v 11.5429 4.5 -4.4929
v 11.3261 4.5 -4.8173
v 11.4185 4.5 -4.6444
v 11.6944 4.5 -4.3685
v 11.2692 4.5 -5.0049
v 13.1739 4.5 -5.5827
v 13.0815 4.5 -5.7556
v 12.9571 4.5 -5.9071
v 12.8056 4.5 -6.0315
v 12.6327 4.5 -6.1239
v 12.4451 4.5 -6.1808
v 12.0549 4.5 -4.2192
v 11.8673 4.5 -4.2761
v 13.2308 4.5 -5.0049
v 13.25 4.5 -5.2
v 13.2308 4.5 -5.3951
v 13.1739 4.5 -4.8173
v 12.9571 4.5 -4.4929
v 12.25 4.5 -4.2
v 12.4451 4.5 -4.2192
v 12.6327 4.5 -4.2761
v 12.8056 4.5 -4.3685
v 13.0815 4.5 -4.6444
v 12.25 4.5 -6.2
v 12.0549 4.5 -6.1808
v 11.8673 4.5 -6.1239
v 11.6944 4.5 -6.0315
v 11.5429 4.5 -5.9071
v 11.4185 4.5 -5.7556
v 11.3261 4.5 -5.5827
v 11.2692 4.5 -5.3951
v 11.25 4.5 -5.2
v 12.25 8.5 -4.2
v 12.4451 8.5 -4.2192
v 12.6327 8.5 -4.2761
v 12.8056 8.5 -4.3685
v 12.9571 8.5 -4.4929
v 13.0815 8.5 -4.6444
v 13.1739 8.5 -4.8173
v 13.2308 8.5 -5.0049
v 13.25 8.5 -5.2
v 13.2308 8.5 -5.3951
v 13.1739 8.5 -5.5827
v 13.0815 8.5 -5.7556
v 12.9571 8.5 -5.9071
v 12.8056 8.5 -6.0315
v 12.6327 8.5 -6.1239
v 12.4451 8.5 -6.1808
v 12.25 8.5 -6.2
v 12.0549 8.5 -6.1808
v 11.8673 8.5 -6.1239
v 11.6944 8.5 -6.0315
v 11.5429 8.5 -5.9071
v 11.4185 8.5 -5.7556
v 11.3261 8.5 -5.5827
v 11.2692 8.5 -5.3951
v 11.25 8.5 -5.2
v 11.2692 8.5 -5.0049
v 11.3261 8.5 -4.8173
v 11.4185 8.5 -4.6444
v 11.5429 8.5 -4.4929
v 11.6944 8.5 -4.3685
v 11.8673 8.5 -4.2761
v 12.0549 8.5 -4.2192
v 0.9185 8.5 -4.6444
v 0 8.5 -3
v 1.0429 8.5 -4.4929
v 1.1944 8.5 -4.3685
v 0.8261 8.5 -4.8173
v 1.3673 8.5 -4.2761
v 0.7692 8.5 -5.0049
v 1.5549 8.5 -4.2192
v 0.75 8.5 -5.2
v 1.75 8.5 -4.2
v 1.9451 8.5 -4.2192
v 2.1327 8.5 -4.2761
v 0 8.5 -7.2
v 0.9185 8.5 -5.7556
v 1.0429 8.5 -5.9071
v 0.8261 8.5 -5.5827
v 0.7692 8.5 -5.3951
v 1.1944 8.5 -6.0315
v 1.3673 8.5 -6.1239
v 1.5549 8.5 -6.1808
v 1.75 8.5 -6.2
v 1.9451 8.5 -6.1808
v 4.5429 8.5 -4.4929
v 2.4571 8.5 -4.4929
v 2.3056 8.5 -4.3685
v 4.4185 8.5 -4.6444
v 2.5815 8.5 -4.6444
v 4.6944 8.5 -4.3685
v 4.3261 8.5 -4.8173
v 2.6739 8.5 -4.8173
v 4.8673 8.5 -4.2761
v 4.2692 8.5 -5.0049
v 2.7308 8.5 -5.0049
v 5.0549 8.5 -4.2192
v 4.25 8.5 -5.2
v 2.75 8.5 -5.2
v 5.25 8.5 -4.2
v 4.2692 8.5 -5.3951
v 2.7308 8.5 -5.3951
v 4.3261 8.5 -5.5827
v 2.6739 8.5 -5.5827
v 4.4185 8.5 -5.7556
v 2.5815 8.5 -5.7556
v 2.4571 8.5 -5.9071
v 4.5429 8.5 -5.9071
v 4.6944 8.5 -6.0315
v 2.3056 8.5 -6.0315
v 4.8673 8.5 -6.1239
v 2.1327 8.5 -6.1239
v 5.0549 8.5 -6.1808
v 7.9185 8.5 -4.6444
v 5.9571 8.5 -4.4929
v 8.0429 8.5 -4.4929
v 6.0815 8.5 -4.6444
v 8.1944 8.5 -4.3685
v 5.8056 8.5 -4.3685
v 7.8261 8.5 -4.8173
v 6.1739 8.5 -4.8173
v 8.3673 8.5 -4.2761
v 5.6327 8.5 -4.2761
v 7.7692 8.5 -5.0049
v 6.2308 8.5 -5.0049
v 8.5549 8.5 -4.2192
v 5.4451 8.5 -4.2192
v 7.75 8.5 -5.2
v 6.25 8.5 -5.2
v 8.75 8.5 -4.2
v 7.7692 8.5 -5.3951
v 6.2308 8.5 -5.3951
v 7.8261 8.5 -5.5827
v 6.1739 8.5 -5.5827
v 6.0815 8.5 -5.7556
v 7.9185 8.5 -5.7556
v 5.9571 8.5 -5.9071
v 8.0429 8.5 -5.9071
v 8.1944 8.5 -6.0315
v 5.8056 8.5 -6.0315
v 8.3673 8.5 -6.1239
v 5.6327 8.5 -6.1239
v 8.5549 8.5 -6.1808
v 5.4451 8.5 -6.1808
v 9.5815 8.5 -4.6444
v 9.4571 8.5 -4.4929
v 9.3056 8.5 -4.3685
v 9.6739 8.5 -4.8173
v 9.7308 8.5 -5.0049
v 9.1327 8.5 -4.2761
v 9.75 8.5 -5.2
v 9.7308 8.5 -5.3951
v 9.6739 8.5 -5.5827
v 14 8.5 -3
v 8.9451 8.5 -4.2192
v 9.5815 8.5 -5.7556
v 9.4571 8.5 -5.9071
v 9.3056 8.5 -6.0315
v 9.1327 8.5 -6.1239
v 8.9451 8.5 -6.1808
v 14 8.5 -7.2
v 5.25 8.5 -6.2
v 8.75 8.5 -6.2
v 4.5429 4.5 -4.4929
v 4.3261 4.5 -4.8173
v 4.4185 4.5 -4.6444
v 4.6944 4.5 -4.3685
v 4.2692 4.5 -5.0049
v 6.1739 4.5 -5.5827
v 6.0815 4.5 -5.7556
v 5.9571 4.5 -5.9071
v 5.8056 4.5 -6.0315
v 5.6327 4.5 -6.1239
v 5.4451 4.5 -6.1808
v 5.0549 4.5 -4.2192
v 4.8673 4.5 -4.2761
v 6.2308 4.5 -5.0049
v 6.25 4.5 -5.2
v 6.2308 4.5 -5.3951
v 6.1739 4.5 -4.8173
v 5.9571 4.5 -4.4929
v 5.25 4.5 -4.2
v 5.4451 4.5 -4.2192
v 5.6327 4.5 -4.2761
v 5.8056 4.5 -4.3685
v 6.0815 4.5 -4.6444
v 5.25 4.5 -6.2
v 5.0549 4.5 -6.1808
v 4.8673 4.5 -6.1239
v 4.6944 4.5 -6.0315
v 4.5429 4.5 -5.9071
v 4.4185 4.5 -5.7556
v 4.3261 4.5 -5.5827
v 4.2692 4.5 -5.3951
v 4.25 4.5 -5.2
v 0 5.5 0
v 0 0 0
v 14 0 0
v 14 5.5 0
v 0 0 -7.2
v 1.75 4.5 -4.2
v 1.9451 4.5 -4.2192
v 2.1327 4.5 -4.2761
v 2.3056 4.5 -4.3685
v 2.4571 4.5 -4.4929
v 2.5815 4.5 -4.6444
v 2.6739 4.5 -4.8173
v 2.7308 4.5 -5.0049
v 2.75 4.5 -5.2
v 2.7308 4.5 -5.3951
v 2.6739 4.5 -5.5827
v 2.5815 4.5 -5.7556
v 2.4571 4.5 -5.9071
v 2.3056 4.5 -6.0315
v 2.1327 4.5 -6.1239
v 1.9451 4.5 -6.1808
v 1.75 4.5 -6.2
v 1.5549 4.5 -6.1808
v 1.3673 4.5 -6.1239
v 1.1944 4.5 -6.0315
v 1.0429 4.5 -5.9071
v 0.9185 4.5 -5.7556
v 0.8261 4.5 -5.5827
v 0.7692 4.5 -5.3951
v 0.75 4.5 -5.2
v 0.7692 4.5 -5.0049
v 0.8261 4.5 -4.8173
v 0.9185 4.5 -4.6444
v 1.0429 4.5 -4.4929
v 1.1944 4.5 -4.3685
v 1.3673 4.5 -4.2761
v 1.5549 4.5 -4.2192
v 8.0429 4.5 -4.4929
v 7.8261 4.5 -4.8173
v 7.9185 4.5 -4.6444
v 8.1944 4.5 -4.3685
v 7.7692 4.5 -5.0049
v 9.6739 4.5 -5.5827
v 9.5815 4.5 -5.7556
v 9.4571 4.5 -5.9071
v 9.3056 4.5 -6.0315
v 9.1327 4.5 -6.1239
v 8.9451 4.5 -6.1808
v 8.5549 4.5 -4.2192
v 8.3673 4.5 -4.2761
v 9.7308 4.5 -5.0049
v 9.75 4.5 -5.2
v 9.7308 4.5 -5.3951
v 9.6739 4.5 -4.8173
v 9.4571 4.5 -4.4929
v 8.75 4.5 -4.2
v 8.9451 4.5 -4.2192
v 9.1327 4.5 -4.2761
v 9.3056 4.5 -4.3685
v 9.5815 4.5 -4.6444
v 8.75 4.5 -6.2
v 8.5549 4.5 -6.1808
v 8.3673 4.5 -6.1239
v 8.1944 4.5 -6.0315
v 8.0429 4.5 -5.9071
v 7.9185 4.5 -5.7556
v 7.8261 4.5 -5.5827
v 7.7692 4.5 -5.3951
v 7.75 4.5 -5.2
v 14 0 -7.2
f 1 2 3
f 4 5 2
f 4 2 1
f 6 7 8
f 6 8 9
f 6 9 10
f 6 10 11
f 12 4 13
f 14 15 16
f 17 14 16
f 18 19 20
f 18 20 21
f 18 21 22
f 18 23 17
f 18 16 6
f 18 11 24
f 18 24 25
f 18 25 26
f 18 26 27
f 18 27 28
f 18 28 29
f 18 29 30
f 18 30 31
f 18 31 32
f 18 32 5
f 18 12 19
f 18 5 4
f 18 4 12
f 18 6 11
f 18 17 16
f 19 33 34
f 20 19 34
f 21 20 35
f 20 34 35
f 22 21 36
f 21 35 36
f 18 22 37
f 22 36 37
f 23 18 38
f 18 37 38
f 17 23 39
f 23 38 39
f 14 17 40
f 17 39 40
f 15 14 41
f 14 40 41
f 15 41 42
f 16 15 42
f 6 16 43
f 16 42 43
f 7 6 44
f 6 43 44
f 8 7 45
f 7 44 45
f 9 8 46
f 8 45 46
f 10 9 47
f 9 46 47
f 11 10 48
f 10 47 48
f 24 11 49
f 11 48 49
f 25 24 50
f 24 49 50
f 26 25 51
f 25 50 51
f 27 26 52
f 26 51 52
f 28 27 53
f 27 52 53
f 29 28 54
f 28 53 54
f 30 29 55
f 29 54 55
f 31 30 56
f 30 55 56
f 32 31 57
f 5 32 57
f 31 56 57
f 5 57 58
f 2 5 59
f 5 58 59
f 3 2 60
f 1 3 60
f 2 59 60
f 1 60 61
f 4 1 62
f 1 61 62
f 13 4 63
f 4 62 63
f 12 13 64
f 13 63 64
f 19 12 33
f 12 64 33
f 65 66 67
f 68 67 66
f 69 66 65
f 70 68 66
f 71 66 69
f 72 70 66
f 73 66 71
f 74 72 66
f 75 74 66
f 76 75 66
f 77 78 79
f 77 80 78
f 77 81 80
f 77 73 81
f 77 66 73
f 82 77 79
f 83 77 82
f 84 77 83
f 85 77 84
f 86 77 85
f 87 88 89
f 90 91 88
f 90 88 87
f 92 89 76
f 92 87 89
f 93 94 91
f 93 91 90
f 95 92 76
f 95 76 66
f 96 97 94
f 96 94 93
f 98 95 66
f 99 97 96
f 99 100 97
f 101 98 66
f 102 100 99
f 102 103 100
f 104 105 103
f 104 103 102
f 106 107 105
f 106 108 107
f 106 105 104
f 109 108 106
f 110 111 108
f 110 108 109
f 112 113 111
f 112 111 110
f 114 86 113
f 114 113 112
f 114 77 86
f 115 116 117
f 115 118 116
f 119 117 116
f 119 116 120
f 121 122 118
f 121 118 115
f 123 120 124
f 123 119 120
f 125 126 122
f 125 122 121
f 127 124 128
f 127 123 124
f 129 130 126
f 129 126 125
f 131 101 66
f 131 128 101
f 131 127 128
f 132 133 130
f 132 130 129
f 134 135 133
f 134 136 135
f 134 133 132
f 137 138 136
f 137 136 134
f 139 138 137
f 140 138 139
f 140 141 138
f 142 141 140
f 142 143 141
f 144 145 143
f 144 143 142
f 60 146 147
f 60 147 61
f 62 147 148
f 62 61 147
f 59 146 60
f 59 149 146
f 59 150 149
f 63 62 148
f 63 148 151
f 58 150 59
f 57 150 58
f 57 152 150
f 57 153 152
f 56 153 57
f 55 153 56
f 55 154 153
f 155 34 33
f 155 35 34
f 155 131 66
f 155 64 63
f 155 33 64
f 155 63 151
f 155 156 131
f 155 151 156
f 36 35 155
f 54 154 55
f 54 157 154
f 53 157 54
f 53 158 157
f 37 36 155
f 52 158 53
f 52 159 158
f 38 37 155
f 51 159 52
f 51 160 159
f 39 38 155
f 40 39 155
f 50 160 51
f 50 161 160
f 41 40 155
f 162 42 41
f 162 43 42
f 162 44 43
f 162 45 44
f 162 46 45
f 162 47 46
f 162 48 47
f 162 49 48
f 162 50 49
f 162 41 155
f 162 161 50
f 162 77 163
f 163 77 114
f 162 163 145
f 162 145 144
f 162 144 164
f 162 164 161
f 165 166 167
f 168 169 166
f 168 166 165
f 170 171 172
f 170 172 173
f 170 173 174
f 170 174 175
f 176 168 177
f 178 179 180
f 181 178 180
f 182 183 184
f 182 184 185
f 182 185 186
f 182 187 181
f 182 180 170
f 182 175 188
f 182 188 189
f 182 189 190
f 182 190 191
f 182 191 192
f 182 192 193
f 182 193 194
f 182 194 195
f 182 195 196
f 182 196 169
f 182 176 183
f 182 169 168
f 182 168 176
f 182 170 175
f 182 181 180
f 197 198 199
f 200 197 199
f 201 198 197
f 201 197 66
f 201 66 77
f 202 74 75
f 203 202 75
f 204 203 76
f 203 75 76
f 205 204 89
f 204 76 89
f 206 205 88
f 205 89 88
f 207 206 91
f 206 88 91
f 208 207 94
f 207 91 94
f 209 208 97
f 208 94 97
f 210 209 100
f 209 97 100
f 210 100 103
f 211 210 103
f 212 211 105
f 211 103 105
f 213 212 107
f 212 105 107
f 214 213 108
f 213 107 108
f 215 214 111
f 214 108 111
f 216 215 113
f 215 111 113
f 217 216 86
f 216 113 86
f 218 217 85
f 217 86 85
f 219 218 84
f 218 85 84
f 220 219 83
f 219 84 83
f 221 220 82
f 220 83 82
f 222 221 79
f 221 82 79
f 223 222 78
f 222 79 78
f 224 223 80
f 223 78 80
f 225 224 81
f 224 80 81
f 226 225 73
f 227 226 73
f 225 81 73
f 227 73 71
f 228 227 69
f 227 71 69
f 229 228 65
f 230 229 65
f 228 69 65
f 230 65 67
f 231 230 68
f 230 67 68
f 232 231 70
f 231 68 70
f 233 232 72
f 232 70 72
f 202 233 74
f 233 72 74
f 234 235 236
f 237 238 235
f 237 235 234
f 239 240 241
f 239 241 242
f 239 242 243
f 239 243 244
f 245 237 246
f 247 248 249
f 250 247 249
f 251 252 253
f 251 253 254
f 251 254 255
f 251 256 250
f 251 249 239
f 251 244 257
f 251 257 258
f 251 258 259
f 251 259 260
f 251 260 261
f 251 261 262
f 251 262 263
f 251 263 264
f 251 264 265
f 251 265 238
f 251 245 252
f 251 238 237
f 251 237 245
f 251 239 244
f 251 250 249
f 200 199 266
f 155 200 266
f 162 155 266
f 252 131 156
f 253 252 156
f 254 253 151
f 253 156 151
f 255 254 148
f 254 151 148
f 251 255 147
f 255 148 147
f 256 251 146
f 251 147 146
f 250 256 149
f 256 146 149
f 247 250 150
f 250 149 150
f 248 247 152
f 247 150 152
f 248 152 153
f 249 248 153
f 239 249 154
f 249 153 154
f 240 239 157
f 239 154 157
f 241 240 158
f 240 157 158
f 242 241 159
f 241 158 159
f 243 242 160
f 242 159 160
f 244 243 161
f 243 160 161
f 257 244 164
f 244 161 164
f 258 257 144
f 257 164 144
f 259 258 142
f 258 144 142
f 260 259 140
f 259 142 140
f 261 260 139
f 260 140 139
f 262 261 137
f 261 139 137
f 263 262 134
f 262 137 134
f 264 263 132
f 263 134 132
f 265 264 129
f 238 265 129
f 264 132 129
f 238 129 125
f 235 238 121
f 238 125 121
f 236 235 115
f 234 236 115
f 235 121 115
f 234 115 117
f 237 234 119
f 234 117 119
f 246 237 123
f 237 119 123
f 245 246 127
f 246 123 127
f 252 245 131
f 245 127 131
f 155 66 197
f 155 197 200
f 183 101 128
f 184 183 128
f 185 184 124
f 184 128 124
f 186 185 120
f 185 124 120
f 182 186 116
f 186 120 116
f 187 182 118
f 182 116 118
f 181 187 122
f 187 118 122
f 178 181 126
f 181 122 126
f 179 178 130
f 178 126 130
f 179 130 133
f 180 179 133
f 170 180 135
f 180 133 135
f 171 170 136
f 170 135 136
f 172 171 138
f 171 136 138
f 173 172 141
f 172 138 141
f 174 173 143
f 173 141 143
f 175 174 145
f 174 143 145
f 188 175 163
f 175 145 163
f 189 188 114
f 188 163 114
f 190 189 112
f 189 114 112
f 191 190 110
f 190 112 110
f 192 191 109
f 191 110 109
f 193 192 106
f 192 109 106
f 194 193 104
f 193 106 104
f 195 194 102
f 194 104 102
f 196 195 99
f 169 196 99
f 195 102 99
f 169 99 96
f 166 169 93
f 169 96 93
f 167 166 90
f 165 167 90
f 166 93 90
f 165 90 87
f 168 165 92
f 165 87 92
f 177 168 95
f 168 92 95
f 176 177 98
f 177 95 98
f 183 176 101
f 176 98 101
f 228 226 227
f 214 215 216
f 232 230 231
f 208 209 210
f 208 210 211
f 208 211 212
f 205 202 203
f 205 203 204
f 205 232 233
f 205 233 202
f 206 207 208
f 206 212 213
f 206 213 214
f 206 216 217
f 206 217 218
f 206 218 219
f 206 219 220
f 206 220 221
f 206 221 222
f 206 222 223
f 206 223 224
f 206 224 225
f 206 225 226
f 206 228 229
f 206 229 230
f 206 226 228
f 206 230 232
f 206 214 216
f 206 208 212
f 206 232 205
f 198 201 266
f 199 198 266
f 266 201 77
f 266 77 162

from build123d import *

# Parameters (mm, degrees)
SKETCH_1_W          = 14
SKETCH_1_H          = 7.2
EXTRUDE_1_DEPTH     = 8.5
CHAMFER_1_SIZE      = 3
SKETCH_2_R          = 1
CUT_EXTRUDE_1_DEPTH = 4


with BuildPart() as part:
    # Эскиз1 → Бобышка-Вытянуть1 (new body)
    with BuildSketch(Plane(origin=(0, 0, 0), x_dir=(1, 0, 0), z_dir=(0, 1, 0))):
        with Locations((7, 3.6)):
            Rectangle(SKETCH_1_W, SKETCH_1_H)
    extrude(amount=EXTRUDE_1_DEPTH)

    # Фаска1
    chamfer_1_edges = [part.edges().sort_by_distance(p)[0] for p in [
        (7, 8.5, 0),
    ]]
    chamfer(chamfer_1_edges, length=CHAMFER_1_SIZE)

    # Эскиз2 → Вырез-Вытянуть1 (cut)
    with BuildSketch(Plane(origin=(0, 8.5, 0), x_dir=(1, 0, 0), z_dir=(0, 1, 0))):
        with Locations(Location((1.75, 5.2, 0), (0, 0, 270))):
            Circle(SKETCH_2_R)
        with Locations(Location((5.25, 5.2, 0), (0, 0, 270))):
            Circle(SKETCH_2_R)
        with Locations(Location((8.75, 5.2, 0), (0, 0, 270))):
            Circle(SKETCH_2_R)
        with Locations(Location((12.25, 5.2, 0), (0, 0, 270))):
            Circle(SKETCH_2_R)
    extrude(amount=-CUT_EXTRUDE_1_DEPTH, mode=Mode.SUBTRACT)


solid = part.part
